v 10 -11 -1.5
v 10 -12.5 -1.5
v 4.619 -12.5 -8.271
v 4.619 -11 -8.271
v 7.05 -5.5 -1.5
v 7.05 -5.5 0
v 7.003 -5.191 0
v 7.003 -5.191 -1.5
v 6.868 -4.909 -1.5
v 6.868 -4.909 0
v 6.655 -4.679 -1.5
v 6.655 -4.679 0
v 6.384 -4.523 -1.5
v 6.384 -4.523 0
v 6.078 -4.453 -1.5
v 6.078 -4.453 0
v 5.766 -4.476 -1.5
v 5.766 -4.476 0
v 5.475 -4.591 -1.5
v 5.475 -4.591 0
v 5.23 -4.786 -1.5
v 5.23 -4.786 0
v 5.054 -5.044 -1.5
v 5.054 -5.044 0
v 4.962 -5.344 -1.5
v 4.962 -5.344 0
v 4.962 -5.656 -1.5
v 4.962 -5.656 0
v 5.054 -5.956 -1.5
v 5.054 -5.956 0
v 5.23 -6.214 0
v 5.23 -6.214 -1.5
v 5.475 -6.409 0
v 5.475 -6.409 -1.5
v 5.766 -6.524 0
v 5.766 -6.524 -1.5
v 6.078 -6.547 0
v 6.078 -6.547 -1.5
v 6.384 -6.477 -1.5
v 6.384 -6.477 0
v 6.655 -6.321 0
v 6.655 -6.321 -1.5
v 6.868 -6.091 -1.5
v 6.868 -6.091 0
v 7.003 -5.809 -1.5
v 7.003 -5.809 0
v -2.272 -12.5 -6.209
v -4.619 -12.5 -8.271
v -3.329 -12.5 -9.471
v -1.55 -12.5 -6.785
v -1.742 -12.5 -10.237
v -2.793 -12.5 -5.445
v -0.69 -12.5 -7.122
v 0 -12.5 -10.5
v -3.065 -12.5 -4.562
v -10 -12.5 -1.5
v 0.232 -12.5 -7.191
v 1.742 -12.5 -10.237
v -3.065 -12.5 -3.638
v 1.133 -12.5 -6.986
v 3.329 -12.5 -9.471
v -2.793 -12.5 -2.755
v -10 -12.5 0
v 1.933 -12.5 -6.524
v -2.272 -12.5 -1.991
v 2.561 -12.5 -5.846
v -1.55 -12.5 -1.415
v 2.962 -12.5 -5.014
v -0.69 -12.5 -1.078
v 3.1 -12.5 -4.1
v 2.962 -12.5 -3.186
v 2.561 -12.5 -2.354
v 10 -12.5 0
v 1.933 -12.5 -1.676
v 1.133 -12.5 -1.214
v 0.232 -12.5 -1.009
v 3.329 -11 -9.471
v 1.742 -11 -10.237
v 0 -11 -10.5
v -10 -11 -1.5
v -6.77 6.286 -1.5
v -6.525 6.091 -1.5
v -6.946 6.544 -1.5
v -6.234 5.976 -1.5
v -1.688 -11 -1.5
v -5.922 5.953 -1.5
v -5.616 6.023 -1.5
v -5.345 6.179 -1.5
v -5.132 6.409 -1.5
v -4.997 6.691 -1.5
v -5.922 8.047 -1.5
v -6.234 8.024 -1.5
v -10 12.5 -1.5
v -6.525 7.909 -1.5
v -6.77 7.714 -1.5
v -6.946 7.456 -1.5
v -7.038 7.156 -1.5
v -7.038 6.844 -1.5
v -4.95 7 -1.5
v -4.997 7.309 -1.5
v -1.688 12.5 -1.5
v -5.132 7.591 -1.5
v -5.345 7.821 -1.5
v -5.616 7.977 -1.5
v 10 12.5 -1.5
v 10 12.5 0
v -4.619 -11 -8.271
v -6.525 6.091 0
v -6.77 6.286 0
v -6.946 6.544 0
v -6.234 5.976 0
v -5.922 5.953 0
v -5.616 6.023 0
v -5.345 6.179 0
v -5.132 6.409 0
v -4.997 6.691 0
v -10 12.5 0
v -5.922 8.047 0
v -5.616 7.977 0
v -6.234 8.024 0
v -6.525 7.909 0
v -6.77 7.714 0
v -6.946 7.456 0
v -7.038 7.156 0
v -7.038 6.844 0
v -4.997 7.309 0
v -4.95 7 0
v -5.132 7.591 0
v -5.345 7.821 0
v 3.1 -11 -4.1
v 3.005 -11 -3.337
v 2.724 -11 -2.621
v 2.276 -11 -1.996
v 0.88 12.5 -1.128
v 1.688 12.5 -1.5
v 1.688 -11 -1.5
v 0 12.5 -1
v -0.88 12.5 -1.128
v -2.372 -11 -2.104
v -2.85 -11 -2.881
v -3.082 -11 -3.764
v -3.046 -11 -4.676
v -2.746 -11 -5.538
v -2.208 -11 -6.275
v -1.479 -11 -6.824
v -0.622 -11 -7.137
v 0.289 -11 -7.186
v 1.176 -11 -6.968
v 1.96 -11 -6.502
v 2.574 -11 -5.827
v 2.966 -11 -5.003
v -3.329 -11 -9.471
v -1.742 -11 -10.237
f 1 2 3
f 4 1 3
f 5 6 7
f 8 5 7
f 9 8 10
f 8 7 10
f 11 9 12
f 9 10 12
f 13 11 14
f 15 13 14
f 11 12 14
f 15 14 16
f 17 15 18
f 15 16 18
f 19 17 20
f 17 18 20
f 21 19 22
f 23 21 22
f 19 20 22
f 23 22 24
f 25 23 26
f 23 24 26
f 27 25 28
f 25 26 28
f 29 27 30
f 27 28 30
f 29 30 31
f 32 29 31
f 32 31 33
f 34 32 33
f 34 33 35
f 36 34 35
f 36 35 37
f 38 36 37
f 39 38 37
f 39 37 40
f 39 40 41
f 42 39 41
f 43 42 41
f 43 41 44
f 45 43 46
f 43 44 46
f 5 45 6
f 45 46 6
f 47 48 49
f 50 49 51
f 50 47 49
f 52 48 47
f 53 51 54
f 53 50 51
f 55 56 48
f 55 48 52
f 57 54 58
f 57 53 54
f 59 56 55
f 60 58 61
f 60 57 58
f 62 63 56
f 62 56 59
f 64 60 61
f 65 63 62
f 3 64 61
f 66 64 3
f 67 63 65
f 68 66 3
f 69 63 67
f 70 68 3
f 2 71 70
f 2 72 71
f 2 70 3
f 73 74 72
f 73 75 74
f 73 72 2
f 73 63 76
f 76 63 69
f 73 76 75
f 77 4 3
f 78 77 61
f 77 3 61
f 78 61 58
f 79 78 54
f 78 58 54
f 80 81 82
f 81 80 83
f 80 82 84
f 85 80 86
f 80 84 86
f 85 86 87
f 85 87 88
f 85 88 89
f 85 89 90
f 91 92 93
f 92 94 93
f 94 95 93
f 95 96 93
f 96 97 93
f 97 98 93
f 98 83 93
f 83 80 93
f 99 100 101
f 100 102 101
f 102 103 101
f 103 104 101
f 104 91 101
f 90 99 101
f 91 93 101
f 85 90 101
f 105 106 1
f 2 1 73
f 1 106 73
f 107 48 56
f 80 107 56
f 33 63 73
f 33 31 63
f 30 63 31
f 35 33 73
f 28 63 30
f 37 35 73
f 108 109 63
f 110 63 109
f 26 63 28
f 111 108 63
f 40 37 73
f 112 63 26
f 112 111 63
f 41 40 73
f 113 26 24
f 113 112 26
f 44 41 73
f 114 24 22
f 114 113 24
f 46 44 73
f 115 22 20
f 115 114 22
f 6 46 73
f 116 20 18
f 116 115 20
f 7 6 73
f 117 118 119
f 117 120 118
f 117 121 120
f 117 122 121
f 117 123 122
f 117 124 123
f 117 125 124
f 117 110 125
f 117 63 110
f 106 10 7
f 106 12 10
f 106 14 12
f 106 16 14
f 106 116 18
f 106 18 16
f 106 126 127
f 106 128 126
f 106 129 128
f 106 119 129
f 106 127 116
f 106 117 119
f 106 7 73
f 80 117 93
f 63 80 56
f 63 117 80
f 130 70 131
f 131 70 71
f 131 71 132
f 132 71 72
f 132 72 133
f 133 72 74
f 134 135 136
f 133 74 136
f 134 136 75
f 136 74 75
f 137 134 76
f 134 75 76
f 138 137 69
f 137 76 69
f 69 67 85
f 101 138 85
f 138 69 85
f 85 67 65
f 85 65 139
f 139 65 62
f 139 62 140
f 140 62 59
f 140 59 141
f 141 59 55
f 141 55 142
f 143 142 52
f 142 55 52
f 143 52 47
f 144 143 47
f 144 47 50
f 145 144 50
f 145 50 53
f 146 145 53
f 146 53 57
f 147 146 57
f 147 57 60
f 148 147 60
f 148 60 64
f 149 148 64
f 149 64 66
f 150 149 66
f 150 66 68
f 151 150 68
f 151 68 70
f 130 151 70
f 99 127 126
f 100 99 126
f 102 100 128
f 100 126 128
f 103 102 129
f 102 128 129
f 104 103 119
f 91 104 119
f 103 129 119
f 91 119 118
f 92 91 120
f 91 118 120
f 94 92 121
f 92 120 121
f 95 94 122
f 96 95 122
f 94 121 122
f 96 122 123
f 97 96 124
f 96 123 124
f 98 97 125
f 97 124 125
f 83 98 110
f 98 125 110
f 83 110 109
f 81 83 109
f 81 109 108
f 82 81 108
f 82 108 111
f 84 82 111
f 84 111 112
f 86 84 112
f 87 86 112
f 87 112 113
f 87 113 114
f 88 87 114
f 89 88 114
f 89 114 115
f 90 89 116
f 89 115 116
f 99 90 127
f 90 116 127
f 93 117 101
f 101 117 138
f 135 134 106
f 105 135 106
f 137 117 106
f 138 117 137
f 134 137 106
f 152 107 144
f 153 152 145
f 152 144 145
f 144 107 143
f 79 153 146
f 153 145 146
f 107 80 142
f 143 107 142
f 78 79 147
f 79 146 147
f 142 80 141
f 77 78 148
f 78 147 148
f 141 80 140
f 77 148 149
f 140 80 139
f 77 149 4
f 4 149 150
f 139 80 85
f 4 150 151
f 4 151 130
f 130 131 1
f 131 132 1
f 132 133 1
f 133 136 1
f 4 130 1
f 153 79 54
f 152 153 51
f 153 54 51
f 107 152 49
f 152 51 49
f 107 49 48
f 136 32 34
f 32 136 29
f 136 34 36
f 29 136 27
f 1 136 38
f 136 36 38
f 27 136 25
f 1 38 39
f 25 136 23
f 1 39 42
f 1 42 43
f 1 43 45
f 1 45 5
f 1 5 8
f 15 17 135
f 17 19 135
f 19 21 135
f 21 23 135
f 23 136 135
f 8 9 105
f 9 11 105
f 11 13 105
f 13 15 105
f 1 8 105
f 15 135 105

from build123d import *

# Parameters (mm, degrees)
F0_W     = 20
F0_H     = 25
F0_R     = 1.05
F1_DEPTH = 1.5
F2_W     = 20
F2_H     = 1.5
F3_DEPTH = 9
F4_R     = 3.1
F5_DEPTH = 30


with BuildPart() as f1:
    # F0 (on Top) → F1 (new body)
    with BuildSketch(Plane.XY):
        Rectangle(F0_W, F0_H)
        with Locations((6, -5.5)):
            Circle(F0_R, mode=Mode.SUBTRACT)
        with Locations((-6, 7)):
            Circle(F0_R, mode=Mode.SUBTRACT)
    extrude(amount=-F1_DEPTH)

    # F2 (on face) → F3 (join)
    with BuildSketch(Plane(origin=(0, 0, -1.5), x_dir=(1, 0, 0), z_dir=(0, 0, -1))):
        with Locations((0, 11.75)):
            Rectangle(F2_W, F2_H)
    extrude(amount=F3_DEPTH)

    # F4 (on face) → F5 (cut)
    with BuildSketch(Plane.XZ.offset(12.5)):
        with Locations((0, -4.1)):
            Circle(F4_R)
        with BuildLine():
            Line((-4.618965, -8.270854), (-10, -1.5))
            Line((-10, -1.5), (-10, -10.5))
            Line((-10, -10.5), (0, -10.5))
            ThreePointArc((0, -10.5), (-2.564368, -9.913569), (-4.618965, -8.270854))
        make_face()
        with BuildLine():
            ThreePointArc((4.618965, -8.270854), (2.564368, -9.913569), (0, -10.5))
            Line((0, -10.5), (10, -10.5))
            Line((10, -10.5), (10, -1.5))
            Line((10, -1.5), (4.618965, -8.270854))
        make_face()
    extrude(amount=-F5_DEPTH, mode=Mode.SUBTRACT)


solid = f1.part
